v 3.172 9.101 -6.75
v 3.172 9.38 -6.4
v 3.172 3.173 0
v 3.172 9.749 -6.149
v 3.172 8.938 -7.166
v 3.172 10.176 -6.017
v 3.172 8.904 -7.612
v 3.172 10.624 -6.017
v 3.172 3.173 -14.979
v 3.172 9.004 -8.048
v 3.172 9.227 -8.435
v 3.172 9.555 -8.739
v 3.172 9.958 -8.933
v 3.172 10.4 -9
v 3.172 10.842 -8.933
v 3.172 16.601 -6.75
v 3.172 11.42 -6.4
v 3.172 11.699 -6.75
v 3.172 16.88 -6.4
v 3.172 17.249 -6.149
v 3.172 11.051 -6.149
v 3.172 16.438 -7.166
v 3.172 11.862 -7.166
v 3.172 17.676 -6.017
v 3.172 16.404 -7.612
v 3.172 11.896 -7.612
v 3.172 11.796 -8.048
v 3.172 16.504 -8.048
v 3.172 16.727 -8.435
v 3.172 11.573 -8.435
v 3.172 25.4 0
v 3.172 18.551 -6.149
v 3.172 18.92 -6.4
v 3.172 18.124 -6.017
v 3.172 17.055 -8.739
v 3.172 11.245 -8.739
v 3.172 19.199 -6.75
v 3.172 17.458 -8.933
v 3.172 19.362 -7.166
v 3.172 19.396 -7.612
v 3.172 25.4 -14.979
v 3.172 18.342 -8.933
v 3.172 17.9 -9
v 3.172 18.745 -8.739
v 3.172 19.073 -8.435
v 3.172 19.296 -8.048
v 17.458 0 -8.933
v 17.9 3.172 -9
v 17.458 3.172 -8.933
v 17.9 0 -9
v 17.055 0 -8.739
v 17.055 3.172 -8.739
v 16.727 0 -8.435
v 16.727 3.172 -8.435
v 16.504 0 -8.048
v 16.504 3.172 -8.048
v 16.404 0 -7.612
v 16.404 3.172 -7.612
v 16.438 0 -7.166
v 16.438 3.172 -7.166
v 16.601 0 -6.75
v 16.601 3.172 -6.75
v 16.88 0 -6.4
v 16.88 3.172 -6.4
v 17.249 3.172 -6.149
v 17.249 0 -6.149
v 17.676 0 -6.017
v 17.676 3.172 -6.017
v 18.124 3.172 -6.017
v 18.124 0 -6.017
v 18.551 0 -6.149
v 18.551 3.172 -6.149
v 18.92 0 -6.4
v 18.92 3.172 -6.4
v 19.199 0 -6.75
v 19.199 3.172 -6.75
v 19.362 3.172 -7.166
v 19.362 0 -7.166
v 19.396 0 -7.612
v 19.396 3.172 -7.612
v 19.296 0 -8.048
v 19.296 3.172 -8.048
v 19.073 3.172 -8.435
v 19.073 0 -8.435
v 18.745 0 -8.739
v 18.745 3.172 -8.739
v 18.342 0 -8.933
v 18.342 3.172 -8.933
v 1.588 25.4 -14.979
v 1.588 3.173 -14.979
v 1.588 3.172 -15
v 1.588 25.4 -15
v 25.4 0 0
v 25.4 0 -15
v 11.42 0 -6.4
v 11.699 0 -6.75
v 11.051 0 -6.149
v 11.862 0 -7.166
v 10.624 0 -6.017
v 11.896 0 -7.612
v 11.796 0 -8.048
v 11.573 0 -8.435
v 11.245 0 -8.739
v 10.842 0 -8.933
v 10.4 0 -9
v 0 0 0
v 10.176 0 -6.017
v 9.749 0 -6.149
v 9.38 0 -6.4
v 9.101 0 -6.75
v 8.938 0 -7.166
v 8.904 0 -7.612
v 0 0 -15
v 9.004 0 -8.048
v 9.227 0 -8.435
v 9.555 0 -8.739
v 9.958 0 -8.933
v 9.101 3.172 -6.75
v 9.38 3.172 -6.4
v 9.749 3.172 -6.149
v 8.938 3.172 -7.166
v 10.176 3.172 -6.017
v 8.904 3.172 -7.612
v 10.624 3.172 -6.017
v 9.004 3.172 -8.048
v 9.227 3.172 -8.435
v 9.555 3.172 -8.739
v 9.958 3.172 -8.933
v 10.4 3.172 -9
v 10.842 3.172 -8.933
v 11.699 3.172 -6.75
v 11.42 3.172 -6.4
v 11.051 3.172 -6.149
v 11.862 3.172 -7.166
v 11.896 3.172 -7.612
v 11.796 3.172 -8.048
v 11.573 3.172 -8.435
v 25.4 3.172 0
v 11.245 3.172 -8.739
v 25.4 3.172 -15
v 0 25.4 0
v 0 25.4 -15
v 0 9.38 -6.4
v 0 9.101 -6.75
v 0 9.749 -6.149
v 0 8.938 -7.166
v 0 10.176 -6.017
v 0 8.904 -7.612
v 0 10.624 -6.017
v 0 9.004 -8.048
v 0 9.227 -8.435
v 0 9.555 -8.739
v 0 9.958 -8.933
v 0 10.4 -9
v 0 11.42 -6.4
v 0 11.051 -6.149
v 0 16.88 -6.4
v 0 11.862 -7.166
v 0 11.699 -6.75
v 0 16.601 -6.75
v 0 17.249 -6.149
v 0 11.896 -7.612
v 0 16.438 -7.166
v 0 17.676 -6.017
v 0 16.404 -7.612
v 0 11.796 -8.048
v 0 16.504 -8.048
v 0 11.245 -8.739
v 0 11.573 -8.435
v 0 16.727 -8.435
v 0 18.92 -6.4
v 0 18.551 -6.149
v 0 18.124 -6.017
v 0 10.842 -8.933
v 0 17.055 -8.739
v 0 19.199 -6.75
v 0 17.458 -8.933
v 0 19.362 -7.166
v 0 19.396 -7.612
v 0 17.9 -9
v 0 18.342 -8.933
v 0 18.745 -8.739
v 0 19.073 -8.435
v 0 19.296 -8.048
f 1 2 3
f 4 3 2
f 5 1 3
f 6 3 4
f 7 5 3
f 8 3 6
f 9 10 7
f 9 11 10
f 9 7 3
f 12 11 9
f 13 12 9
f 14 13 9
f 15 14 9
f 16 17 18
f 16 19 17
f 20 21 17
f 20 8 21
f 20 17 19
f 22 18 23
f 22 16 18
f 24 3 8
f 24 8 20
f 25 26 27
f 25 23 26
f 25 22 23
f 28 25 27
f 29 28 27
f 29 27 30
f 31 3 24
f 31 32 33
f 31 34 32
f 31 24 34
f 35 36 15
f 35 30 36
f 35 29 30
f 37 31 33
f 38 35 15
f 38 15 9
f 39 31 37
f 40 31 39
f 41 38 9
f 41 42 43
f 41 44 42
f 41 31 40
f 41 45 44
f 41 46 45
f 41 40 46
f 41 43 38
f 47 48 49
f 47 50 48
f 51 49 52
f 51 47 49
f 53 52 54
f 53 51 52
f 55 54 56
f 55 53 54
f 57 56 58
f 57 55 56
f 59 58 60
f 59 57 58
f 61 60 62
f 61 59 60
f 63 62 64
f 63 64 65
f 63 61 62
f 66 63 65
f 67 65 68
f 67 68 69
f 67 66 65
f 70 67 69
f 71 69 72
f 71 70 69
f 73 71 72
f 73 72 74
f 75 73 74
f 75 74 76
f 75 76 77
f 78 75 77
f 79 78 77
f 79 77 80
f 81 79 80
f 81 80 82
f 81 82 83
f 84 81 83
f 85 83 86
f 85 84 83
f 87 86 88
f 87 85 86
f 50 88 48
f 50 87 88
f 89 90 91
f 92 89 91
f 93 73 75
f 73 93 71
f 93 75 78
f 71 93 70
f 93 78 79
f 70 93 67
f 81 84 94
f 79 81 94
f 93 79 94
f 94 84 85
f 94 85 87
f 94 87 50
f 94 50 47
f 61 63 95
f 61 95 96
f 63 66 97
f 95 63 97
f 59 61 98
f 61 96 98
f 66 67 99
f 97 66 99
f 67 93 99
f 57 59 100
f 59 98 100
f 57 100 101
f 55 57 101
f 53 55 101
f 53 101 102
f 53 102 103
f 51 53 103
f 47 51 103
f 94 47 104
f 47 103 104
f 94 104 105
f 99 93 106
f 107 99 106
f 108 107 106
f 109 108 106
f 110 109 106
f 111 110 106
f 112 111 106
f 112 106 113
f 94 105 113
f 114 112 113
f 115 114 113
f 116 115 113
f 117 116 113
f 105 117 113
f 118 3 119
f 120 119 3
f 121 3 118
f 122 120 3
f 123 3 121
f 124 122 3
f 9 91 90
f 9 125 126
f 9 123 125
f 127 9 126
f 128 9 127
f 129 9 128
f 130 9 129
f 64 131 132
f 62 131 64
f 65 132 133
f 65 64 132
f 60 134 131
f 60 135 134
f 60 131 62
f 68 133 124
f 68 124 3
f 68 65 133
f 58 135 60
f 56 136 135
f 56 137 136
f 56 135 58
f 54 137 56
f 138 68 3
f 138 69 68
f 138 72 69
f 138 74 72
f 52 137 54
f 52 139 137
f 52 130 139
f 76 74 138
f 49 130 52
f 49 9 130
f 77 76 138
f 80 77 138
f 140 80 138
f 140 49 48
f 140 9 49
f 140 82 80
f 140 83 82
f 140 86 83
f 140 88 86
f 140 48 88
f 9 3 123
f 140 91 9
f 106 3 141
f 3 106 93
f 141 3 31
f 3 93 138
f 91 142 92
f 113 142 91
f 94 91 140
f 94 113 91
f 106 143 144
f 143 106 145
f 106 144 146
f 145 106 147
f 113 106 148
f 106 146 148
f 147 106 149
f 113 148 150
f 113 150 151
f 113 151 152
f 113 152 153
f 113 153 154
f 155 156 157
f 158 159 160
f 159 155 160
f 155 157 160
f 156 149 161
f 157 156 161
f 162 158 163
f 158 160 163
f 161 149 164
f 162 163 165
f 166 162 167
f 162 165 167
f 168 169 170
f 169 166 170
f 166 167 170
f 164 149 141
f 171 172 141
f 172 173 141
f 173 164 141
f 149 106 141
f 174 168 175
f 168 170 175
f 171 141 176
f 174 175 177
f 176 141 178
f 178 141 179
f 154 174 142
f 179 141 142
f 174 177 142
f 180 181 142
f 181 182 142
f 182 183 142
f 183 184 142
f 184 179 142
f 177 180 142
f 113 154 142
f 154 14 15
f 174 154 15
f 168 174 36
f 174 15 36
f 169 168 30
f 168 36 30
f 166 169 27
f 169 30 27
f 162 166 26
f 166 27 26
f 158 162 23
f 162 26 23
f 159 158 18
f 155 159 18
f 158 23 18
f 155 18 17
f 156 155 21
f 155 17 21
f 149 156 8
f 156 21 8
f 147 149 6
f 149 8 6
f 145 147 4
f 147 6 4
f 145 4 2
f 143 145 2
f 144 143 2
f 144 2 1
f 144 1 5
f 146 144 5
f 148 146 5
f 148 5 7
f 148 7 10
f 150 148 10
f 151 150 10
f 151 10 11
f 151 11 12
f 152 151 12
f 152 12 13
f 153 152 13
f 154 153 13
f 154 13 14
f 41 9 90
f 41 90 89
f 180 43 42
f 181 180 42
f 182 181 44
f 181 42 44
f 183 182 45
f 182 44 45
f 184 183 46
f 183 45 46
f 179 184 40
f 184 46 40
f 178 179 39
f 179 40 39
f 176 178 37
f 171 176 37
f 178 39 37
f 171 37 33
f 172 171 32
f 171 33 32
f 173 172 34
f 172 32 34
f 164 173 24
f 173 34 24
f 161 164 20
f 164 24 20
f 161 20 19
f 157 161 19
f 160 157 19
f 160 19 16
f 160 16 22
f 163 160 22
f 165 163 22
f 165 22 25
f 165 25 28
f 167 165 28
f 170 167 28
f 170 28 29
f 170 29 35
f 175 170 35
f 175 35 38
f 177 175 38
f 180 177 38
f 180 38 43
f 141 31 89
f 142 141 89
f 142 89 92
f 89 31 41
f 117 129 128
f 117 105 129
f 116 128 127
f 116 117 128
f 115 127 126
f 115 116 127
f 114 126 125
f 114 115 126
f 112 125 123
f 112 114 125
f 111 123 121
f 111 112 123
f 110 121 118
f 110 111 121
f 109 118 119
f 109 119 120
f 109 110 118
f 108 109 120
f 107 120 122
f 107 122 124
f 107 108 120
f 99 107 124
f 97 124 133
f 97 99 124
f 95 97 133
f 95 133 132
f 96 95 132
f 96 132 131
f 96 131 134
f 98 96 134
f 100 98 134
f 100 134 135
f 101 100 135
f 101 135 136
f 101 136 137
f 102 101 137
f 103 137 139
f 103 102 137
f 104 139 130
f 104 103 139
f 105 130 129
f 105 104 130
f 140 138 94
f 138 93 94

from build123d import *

# Parameters (mm, degrees)
SKETCH1_W           = 15
SKETCH1_H           = 25.4
BOSS_EXTRUDE1_DEPTH = 3.175
SKETCH2_W           = 15
SKETCH2_H           = 3.175
BOSS_EXTRUDE2_DEPTH = 22.225
SKETCH4_R           = 1.5
CUT_EXTRUDE3_DEPTH  = 37.933868265
SKETCH3_R           = 1.5
CUT_EXTRUDE4_DEPTH  = 39.927111375
SKETCH5_W           = 22.225
SKETCH5_H           = 15
CUT_EXTRUDE5_DEPTH  = 1.5875
CUT_EXTRUDE6_START  = -1.5875
SKETCH6_W           = 15
SKETCH6_H           = 23.8125
CUT_EXTRUDE6_DEPTH  = 1.5875
SKETCH7_W           = 23.8125
SKETCH7_H           = 15
SKETCH7_R           = 1.5
BOSS_EXTRUDE5_DEPTH = 1.585
BOSS_EXTRUDE6_START = 1.585
SKETCH8_W           = 14.97890093
SKETCH8_H           = 22.2275
SKETCH8_R           = 1.5
BOSS_EXTRUDE6_DEPTH = 1.585


with BuildPart() as part:
    # Sketch1 → Boss-Extrude1 (new body)
    with BuildSketch(Plane(origin=(0, 0, 0), x_dir=(0, 0, -1), z_dir=(1, 0, 0))):
        with Locations((7.5, 12.7)):
            Rectangle(SKETCH1_W, SKETCH1_H)
    extrude(amount=BOSS_EXTRUDE1_DEPTH)

    # Sketch2 → Boss-Extrude2 (add)
    with BuildSketch(Plane(origin=(3.175, 0, 0), x_dir=(0, 0, -1), z_dir=(1, 0, 0))):
        with Locations((7.5, 1.5875)):
            Rectangle(SKETCH2_W, SKETCH2_H)
    extrude(amount=BOSS_EXTRUDE2_DEPTH)

    # Sketch4 → Cut-Extrude3 (cut, through all)
    with BuildSketch(Plane(origin=(3.175, 0, 0), x_dir=(0, 0, -1), z_dir=(1, 0, 0))):
        with Locations((7.5, 17.9)):
            Circle(SKETCH4_R)
        with Locations((7.5, 10.4)):
            Circle(SKETCH4_R)
    extrude(amount=-CUT_EXTRUDE3_DEPTH, mode=Mode.SUBTRACT)

    # Sketch3 → Cut-Extrude4 (cut, through all)
    with BuildSketch(Plane.XZ):
        with Locations(Location((10.4, -7.5, 0), (0, 0, 270))):
            Circle(SKETCH3_R)
        with Locations(Location((17.9, -7.5, 0), (0, 0, 270))):
            Circle(SKETCH3_R)
    extrude(amount=-CUT_EXTRUDE4_DEPTH, mode=Mode.SUBTRACT)

    # Sketch5 → Cut-Extrude5 (cut)
    with BuildSketch(Plane(origin=(0, 3.175, 0), x_dir=(1, 0, 0), z_dir=(0, 1, 0))):
        with Locations((14.2875, 7.5)):
            Rectangle(SKETCH5_W, SKETCH5_H)
    extrude(amount=-CUT_EXTRUDE5_DEPTH, mode=Mode.SUBTRACT)

    # Sketch6 → Cut-Extrude6 (cut)
    with BuildSketch(Plane(origin=(3.175, 0, 0), x_dir=(0, 0, -1), z_dir=(1, 0, 0)).offset(CUT_EXTRUDE6_START)):
        with Locations((7.5, 13.49375)):
            Rectangle(SKETCH6_W, SKETCH6_H)
    extrude(amount=CUT_EXTRUDE6_DEPTH, mode=Mode.SUBTRACT)

    # Sketch7 → Boss-Extrude5 (add)
    with BuildSketch(Plane(origin=(0, 1.5875, 0), x_dir=(1, 0, 0), z_dir=(0, 1, 0))):
        with Locations((13.49375, 7.5)):
            Rectangle(SKETCH7_W, SKETCH7_H)
        with Locations(Location((10.4, 7.5, 0), (0, 0, 90))):
            Circle(SKETCH7_R, mode=Mode.SUBTRACT)
        with Locations(Location((17.9, 7.5, 0), (0, 0, 90))):
            Circle(SKETCH7_R, mode=Mode.SUBTRACT)
    extrude(amount=BOSS_EXTRUDE5_DEPTH)

    # Sketch8 → Boss-Extrude6 (add)
    with BuildSketch(Plane(origin=(1.5875, 0, 0), x_dir=(0, 0, -1), z_dir=(1, 0, 0)).offset(BOSS_EXTRUDE6_START)):
        with Locations((7.489450465, 14.28625)):
            Rectangle(SKETCH8_W, SKETCH8_H)
        with Locations((7.5, 17.9)):
            Circle(SKETCH8_R, mode=Mode.SUBTRACT)
        with Locations((7.5, 10.4)):
            Circle(SKETCH8_R, mode=Mode.SUBTRACT)
    extrude(amount=-BOSS_EXTRUDE6_DEPTH)


solid = part.part
